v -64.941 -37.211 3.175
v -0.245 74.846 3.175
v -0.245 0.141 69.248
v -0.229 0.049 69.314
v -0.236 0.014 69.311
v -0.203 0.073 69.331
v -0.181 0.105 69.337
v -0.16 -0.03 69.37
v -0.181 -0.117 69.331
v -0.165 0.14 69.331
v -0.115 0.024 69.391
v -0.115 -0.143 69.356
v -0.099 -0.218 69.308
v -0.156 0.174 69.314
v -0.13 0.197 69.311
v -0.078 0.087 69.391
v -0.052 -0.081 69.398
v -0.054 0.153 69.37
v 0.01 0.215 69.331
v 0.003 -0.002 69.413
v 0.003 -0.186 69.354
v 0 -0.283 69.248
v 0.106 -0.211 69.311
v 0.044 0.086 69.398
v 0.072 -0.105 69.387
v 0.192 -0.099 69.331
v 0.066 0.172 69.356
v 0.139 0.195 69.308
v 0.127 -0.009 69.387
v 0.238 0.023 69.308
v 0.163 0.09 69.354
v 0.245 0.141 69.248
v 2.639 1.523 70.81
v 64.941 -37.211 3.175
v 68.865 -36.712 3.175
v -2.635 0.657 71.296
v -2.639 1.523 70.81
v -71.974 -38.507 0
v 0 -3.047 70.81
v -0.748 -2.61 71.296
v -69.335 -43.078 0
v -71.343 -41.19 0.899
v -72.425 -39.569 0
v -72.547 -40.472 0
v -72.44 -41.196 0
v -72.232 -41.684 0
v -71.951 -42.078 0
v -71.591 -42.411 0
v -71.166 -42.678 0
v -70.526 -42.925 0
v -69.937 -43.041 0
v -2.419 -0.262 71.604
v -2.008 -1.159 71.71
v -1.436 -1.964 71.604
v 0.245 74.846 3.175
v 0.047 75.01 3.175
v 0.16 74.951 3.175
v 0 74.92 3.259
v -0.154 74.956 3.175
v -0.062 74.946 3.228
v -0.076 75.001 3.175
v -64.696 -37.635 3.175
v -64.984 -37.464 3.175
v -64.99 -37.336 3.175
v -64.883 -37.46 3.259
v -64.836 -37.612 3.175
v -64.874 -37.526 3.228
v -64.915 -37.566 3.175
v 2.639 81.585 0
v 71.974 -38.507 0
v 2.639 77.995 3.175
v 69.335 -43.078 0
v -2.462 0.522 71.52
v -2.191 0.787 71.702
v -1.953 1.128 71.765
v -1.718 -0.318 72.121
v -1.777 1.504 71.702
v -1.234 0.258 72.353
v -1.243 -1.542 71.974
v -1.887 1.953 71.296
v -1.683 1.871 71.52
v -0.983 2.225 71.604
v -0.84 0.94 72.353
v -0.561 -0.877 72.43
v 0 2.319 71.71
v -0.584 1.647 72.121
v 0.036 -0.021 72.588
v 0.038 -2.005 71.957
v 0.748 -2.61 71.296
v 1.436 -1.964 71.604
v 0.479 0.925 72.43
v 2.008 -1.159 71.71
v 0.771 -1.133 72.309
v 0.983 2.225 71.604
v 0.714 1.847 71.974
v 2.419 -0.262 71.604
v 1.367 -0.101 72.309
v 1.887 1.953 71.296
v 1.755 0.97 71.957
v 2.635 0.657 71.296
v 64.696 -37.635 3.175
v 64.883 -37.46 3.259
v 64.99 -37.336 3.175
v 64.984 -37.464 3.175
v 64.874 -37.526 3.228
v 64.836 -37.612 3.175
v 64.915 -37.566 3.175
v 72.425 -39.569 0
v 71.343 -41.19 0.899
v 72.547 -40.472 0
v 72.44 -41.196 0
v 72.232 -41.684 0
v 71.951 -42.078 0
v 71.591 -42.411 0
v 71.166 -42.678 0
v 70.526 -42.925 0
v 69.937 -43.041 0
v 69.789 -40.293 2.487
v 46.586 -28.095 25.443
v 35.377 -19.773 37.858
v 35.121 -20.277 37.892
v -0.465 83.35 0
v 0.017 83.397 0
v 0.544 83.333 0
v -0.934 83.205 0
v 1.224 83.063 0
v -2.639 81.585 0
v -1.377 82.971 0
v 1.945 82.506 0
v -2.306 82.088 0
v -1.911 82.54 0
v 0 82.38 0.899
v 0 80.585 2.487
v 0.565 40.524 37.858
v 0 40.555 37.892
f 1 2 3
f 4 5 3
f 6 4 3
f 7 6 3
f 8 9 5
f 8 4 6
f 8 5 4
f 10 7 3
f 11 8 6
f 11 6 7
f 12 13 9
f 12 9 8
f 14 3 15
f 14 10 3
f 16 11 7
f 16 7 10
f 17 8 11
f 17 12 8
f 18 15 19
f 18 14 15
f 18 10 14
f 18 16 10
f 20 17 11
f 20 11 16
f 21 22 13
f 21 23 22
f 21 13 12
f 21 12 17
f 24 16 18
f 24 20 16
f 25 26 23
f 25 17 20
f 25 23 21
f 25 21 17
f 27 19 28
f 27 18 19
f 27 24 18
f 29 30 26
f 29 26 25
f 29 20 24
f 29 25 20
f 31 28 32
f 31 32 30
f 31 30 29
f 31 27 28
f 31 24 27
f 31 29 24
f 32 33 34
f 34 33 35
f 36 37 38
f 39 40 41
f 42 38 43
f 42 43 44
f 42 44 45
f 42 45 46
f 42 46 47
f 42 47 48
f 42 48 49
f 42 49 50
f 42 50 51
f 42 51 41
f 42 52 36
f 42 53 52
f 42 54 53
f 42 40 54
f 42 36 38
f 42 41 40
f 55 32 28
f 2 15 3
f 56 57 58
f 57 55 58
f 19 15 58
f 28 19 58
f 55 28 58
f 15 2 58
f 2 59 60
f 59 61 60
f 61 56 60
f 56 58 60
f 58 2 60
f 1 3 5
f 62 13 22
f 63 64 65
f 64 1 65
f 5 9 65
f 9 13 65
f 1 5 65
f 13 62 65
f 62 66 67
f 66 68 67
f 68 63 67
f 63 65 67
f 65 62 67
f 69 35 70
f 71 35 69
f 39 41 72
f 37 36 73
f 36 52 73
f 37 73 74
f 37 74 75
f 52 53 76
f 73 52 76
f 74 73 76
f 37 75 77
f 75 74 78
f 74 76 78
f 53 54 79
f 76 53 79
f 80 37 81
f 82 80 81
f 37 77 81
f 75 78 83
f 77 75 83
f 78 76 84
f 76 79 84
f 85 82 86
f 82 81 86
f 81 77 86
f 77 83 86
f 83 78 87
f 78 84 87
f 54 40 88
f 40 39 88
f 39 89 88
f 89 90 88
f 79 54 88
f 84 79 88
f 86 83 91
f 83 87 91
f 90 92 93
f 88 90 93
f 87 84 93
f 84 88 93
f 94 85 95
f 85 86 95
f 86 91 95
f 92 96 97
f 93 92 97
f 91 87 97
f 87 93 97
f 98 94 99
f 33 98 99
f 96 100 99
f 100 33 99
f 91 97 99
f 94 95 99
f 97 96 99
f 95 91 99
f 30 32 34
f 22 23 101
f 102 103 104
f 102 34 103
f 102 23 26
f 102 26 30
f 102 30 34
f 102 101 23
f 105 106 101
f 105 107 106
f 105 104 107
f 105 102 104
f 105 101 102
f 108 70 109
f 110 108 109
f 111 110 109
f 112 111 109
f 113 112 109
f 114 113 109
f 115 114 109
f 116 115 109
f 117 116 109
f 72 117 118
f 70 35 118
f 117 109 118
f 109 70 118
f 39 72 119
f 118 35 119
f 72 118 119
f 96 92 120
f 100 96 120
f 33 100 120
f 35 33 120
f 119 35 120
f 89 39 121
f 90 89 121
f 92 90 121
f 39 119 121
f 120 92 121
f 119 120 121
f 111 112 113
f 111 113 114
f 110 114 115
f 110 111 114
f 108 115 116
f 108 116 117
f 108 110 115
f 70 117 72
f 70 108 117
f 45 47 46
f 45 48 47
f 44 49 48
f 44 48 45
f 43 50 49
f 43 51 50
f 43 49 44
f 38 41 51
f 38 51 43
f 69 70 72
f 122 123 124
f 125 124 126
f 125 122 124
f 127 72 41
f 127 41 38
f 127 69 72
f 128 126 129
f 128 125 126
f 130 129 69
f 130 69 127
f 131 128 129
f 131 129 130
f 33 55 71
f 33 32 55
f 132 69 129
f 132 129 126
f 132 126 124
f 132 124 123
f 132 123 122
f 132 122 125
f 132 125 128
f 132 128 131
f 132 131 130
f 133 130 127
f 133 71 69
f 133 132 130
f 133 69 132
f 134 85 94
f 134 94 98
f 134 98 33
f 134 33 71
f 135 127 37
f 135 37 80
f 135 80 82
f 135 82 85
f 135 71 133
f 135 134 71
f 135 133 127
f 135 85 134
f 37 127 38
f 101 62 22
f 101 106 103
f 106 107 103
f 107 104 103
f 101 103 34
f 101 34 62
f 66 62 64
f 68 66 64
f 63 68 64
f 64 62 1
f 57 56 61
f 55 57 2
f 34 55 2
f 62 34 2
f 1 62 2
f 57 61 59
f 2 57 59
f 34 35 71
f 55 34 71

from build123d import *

# Parameters (mm, degrees)
F4_R = 3.5
F5_T = 3.175


# Not quite as in the source:
# - a shell that OpenCascade refuses in one call is made with other operations: the cavity is built on its own and cut out


with BuildPart() as f3:
    # F0 (on Top) → F3 section 0
    with BuildSketch(Plane.XY, mode=Mode.PRIVATE) as f3_s0:
        Polygon((74.6125, -43.0775469599), (0, 86.1550939198), (-74.6125, -43.0775469599), align=None)
    loft([f3_s0.sketch, Vertex(0, 0, 76.2)])

    # F4
    f4_edges = [f3.edges().sort_by_distance(p)[0] for p in [
        (37.30625, -21.538773, 38.1),
        (-37.30625, -21.538773, 38.1),
        (0, 43.077547, 38.1),
    ]]
    fillet(f4_edges, radius=F4_R)

    # F5: shell of thickness 3.175, made by hand


with BuildPart() as f5_core1:
    # F5_t2: copy of F3
    add(f3.part)

    # the walls: a layer under each face that stays
    f5_faces = [f5_core1.faces().sort_by_distance(p)[0] for p in [
        (0, -23.0621900868, 35.4052238664),
        (17.458808121, -10.0798475684, 0),
        (-37.1159888559, -21.4289261572, 35.8548532751),
        (37.1159888559, -21.4289261572, 35.8548532751),
        (-19.9724424821, 11.5310950434, 35.4052238664),
        (0, 42.8578523144, 35.8548532751),
        (-0.5010139072, 0.2892605142, 72.5398619822),
    ]]
    thicken(f5_faces, amount=-F5_T, mode=Mode.SUBTRACT)


with BuildPart() as f3_1:
    add(f3.part)

    # what is left inside the walls is the cavity
    f5_cavity = [f5_core1.part.solids().sort_by_distance(p)[0] for p in [
        (1.753709, 1.221373, 3.20675),
    ]]
    add(f5_cavity, mode=Mode.SUBTRACT)


solid = f3_1.part
